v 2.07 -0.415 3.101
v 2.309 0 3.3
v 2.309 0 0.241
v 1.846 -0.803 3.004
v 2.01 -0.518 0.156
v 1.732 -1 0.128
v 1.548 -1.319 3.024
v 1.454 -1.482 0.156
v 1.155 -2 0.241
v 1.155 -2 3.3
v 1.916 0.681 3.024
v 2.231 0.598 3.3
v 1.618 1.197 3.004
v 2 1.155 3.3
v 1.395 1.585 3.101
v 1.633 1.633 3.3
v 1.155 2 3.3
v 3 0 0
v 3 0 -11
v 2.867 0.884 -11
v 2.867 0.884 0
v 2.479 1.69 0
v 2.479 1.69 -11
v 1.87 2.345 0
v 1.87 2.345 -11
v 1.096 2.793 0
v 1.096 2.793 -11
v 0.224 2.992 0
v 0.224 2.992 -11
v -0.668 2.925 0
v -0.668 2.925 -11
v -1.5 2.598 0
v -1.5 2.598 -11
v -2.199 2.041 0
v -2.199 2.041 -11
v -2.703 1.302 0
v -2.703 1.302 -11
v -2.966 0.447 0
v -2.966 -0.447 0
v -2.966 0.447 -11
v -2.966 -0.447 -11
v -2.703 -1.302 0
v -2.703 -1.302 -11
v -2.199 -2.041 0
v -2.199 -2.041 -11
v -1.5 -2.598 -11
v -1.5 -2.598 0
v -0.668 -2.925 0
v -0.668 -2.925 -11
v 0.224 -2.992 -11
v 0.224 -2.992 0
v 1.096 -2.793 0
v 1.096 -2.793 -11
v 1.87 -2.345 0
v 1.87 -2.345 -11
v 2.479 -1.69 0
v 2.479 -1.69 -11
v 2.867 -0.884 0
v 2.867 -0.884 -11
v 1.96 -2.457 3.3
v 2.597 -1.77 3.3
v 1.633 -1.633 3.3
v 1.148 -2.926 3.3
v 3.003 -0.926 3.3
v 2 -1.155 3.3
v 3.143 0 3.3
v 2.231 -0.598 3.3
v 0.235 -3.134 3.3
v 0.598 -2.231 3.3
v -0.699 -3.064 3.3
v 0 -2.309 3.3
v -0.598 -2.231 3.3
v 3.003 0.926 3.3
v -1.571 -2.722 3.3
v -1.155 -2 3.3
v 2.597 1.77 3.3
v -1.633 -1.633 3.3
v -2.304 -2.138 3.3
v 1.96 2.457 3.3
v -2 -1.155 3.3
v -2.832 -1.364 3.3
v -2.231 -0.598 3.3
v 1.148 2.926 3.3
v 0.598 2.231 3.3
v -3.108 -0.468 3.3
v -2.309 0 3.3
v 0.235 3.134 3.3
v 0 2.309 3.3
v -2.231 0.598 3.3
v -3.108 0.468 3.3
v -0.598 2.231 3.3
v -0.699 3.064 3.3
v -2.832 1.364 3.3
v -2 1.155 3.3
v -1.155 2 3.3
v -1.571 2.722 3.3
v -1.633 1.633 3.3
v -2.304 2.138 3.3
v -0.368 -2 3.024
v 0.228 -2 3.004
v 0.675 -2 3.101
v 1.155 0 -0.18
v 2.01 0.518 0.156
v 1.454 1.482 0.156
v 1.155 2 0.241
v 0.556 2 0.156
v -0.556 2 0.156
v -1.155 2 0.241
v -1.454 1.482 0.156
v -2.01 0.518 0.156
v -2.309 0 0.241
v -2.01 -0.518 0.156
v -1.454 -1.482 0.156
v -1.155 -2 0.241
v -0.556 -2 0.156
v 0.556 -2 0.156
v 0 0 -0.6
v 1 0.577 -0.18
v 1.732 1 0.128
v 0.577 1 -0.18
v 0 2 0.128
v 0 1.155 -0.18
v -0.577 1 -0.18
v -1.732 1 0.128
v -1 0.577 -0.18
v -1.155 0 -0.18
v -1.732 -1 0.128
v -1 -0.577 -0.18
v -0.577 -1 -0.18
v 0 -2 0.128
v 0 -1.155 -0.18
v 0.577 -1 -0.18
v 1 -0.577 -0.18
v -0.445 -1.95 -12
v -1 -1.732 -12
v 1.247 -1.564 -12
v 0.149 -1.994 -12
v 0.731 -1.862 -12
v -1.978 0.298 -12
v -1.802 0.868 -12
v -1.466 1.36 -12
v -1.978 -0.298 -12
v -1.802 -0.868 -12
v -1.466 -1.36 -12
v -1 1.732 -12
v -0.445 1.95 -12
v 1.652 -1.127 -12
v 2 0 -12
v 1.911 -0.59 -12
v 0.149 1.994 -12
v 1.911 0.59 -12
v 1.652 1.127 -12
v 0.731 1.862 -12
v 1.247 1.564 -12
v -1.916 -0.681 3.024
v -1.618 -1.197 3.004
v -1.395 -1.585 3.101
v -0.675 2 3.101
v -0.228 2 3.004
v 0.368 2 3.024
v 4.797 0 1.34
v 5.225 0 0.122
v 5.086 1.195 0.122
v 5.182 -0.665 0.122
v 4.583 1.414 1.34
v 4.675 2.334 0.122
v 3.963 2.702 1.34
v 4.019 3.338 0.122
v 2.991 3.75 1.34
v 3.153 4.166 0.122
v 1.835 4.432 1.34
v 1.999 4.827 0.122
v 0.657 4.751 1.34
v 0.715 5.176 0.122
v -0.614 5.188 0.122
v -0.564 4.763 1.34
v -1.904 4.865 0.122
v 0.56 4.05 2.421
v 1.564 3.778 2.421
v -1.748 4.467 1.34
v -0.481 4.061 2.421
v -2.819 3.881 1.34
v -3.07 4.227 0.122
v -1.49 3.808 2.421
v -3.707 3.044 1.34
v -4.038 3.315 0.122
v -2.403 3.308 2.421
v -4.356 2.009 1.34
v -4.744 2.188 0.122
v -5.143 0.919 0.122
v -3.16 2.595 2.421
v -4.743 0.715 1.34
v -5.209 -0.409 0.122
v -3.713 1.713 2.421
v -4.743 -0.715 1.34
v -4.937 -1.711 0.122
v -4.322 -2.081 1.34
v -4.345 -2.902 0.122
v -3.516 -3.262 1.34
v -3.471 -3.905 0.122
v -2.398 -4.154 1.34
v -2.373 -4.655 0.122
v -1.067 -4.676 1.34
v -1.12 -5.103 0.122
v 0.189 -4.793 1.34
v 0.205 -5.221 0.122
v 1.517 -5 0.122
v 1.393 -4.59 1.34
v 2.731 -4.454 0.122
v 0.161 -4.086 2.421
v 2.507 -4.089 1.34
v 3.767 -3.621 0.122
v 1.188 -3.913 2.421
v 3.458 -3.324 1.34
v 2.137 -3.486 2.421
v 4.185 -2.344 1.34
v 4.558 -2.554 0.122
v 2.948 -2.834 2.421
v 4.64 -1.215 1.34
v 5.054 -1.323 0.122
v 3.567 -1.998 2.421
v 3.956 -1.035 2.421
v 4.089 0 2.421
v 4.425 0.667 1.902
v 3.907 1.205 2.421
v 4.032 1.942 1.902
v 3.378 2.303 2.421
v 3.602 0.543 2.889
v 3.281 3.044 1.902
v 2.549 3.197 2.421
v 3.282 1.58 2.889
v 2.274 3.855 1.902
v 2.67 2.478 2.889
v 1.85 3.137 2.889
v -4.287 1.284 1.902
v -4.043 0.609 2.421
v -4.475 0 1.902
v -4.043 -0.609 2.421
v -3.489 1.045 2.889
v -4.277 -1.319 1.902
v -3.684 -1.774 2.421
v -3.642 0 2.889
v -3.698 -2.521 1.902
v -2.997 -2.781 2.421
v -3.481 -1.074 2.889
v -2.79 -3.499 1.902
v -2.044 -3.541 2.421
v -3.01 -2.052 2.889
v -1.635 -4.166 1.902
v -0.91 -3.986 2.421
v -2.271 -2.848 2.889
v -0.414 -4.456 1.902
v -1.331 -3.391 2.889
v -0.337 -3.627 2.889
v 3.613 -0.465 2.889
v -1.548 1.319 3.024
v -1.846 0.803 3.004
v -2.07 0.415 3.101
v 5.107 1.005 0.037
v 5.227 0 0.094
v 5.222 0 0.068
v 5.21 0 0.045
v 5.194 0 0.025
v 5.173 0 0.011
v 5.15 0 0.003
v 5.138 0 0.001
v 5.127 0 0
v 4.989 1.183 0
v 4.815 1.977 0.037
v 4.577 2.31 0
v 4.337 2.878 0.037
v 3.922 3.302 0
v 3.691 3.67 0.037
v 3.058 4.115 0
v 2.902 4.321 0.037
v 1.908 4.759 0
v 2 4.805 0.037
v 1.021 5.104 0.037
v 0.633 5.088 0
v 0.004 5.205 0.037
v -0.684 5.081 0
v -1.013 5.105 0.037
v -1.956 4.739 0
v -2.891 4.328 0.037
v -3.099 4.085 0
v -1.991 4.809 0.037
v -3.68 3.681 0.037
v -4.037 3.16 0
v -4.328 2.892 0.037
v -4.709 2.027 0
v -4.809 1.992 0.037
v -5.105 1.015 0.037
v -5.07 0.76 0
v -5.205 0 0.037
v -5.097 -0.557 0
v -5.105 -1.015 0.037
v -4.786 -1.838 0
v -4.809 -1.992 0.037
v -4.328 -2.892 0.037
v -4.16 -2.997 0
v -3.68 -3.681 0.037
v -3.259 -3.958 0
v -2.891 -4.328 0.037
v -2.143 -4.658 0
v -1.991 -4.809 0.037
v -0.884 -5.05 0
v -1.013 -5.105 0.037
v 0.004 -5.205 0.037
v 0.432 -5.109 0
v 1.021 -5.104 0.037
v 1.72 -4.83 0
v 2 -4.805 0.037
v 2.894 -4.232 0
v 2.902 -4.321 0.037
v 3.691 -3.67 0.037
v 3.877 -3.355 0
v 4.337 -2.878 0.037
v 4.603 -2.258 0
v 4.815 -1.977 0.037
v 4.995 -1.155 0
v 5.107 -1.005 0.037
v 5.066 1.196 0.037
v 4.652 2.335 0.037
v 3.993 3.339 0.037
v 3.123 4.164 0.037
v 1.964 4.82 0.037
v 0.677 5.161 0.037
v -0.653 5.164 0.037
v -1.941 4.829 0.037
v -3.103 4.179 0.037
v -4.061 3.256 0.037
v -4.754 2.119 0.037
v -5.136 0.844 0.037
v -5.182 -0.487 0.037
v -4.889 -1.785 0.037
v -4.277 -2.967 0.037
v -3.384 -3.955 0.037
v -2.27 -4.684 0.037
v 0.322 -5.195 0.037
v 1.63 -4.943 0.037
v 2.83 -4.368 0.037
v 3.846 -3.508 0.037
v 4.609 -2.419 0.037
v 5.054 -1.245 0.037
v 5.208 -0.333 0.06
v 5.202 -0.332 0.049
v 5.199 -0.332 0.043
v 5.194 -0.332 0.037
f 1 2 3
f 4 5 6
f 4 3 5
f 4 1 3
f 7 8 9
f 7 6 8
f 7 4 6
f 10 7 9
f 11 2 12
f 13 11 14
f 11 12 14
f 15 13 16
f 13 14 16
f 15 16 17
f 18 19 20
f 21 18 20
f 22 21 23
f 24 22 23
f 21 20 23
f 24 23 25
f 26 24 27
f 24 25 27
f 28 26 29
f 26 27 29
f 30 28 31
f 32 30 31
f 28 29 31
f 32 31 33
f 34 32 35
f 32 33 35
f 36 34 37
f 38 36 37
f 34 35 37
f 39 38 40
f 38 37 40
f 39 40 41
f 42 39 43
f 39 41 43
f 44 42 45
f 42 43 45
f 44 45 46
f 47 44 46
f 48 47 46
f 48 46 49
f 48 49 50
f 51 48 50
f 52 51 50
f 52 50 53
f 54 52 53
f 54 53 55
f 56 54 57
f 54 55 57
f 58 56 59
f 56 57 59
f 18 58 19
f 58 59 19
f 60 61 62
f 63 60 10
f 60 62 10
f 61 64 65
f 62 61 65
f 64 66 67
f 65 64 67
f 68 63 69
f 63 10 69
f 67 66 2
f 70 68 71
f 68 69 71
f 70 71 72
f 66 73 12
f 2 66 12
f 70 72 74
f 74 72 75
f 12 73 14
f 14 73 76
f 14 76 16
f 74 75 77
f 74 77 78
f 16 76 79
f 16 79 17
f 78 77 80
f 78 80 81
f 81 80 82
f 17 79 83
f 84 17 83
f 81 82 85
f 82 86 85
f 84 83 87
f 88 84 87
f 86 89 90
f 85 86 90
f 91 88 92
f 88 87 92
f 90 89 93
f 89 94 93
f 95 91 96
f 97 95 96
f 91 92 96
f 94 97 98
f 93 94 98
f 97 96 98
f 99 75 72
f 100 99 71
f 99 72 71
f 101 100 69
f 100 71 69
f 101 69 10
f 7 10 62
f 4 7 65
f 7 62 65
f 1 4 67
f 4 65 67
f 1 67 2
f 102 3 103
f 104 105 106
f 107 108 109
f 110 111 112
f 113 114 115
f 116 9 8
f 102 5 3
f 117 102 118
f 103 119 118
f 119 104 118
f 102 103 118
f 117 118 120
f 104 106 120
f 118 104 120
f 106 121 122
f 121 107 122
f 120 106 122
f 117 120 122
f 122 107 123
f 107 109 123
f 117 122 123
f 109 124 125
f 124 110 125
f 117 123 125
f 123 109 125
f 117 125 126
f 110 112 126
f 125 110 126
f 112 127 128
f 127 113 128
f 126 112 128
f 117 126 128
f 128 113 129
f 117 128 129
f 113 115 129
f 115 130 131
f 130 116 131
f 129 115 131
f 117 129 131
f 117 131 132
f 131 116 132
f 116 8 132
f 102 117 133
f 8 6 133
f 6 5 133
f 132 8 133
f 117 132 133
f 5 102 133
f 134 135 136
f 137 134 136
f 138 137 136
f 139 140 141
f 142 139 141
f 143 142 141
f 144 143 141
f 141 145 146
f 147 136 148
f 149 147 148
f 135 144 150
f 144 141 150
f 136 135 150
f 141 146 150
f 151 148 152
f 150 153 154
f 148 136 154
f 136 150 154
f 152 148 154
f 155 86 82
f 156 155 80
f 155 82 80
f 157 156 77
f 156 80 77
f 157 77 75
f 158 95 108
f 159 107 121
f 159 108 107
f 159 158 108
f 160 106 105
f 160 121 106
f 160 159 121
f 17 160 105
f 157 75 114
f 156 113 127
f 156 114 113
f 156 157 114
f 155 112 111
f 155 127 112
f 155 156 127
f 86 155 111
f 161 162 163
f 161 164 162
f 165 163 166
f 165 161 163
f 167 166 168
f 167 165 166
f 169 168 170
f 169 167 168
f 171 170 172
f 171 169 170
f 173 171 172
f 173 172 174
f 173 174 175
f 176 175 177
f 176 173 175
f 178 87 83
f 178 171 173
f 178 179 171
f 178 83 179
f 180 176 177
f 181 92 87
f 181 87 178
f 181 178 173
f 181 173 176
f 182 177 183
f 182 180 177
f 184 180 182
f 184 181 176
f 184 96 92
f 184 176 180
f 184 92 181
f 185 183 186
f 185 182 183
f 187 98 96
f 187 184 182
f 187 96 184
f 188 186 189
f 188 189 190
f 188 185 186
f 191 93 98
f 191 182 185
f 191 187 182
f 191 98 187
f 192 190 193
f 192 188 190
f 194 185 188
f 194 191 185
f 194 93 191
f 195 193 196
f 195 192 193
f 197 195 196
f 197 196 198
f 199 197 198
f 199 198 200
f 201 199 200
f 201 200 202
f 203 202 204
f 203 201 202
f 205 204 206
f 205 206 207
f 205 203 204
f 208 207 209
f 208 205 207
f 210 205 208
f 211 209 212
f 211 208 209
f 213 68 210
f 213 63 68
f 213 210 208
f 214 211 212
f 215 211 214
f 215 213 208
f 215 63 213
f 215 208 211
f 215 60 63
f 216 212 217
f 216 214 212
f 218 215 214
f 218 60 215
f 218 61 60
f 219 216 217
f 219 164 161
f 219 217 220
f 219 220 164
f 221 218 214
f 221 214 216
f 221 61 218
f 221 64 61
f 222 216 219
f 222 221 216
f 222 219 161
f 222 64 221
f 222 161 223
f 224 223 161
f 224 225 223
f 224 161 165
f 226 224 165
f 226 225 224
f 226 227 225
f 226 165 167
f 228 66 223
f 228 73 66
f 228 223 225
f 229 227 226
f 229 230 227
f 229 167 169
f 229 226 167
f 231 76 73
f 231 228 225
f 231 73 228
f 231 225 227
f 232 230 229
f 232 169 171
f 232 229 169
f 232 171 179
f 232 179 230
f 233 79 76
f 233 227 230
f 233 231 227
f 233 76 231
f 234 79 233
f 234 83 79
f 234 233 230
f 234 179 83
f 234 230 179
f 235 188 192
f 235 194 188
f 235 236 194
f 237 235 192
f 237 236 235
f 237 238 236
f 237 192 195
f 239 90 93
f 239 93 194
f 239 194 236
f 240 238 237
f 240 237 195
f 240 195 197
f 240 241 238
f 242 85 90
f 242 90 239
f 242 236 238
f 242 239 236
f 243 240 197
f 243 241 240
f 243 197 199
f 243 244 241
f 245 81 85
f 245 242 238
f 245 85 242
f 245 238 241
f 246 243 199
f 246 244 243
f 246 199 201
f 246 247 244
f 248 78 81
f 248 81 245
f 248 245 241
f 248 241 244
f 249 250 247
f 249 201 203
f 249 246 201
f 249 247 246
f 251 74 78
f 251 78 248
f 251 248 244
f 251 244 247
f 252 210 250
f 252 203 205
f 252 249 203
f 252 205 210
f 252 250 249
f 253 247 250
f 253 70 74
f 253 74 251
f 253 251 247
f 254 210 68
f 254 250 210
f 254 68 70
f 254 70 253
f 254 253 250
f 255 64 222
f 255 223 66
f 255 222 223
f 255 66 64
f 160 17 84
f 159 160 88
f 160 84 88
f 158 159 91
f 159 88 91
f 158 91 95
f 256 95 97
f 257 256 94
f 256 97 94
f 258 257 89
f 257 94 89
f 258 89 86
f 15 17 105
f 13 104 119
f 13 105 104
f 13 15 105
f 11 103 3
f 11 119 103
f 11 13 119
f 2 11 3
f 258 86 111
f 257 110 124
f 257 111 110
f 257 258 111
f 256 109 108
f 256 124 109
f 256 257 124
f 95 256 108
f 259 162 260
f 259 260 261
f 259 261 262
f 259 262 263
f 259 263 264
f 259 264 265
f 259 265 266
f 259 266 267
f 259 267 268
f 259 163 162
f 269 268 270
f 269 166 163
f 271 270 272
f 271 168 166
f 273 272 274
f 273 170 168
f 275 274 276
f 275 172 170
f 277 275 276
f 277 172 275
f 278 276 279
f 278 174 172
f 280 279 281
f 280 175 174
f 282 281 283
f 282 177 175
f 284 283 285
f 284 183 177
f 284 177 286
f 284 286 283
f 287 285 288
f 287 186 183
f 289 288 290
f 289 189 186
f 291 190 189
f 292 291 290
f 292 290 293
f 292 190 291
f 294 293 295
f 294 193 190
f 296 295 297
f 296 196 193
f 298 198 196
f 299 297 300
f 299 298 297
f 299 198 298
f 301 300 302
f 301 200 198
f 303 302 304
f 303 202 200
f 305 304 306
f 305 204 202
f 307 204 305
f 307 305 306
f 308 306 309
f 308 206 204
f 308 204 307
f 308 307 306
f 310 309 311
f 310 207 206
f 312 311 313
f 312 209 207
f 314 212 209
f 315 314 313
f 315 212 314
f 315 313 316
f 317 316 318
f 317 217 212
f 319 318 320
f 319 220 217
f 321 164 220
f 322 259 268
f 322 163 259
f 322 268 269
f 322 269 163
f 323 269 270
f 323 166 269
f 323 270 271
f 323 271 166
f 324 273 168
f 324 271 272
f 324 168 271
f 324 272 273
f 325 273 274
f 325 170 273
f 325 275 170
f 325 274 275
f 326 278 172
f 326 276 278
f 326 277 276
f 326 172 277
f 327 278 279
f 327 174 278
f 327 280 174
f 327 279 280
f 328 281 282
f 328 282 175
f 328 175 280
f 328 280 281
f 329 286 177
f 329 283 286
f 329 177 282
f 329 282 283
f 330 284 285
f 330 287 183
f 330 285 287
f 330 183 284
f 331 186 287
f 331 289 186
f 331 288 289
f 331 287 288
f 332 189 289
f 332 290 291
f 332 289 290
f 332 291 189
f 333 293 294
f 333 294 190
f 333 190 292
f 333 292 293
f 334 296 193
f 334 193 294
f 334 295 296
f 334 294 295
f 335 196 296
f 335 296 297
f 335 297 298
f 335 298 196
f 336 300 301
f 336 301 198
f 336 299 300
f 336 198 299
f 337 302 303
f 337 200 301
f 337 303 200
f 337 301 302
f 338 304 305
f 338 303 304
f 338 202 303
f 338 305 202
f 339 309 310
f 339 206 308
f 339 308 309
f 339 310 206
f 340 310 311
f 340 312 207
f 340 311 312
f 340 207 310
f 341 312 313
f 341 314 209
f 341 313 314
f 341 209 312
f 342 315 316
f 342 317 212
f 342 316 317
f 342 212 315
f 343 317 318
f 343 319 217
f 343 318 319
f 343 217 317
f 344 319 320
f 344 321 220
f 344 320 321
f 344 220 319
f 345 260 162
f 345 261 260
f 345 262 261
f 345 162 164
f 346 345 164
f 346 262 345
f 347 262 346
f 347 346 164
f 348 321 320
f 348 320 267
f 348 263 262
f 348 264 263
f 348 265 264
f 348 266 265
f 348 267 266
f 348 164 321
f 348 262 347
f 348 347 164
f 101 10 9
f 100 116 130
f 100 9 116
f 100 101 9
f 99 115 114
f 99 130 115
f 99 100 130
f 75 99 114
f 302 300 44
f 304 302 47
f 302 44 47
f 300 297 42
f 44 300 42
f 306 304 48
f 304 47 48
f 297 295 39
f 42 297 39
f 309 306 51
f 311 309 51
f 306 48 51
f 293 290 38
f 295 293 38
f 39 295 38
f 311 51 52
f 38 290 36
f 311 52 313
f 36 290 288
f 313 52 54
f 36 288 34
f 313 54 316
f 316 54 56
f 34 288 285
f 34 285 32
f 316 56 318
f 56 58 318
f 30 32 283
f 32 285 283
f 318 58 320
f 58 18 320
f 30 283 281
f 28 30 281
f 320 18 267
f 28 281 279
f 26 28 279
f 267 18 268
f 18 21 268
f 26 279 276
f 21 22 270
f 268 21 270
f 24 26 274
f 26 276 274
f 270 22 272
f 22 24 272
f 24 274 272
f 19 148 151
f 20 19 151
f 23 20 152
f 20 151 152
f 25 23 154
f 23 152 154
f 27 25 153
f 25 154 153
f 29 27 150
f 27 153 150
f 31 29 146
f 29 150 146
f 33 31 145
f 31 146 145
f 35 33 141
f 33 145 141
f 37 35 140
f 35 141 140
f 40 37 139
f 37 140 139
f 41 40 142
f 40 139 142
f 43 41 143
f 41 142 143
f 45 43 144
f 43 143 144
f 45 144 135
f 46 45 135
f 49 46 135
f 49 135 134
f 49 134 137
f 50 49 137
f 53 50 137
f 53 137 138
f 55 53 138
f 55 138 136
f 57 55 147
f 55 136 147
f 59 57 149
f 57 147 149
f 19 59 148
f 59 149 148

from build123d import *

# Parameters (mm, degrees)
SKETCH001_R  = 6
POCKET_DEPTH = 10.600854
FILLET_R     = 0.1
CHAMFER_SIZE = 1


with BuildPart() as pocket:
    # Sketch003 → Revolution001 (revolve)
    with BuildSketch(Plane.XZ):
        Polygon((0, -0.599854), (5, 1.22), (5, 10), (0, 10), align=None)
    revolve(axis=Axis((0, 0, 0), (0, 0, 1)))

    # Sketch001 → Pocket (cut, through all)
    with BuildSketch(Plane(origin=(0, 0, 10), x_dir=(-1, 0, 0), z_dir=(0, 0, 1))):
        Circle(SKETCH001_R)
        Polygon((-1.154701, 2), (1.154701, 2), (2.309401, 0), (1.154701, -2), (-1.154701, -2), (-2.309401, 0), align=None, mode=Mode.SUBTRACT)
    extrude(amount=-POCKET_DEPTH, mode=Mode.SUBTRACT)


with BuildPart() as chamfer_body:
    # Sketch → Revolution (revolve)
    with BuildSketch(Plane.XZ):
        with BuildLine():
            Line((2.3094, 3.3), (3.142831, 3.3))
            ThreePointArc((5.25, 0), (4.509146, 1.84969), (3.142831, 3.3))
            Line((5.25, 0), (3, 0))
            Line((3, 0), (3, -12))
            Line((3, -12), (0, -12))
            Line((0, -12), (0, 0.990598))
            Line((0, 0.990598), (2.3094, 3.3))
        make_face()
    revolve(axis=Axis((0, 0, 0), (0, 0, 1)))

    # Cut: cut Pocket
    add(pocket.part, mode=Mode.SUBTRACT)

    # Fillet
    fillet_edges = [chamfer_body.edges().sort_by_distance(p)[0] for p in [
        (-5.25, 0, 0),
    ]]
    fillet(fillet_edges, radius=FILLET_R)

    # Chamfer
    chamfer_edges = [chamfer_body.edges().sort_by_distance(p)[0] for p in [
        (-3, 0, -12),
    ]]
    chamfer(chamfer_edges, length=CHAMFER_SIZE)


solid = chamfer_body.part
